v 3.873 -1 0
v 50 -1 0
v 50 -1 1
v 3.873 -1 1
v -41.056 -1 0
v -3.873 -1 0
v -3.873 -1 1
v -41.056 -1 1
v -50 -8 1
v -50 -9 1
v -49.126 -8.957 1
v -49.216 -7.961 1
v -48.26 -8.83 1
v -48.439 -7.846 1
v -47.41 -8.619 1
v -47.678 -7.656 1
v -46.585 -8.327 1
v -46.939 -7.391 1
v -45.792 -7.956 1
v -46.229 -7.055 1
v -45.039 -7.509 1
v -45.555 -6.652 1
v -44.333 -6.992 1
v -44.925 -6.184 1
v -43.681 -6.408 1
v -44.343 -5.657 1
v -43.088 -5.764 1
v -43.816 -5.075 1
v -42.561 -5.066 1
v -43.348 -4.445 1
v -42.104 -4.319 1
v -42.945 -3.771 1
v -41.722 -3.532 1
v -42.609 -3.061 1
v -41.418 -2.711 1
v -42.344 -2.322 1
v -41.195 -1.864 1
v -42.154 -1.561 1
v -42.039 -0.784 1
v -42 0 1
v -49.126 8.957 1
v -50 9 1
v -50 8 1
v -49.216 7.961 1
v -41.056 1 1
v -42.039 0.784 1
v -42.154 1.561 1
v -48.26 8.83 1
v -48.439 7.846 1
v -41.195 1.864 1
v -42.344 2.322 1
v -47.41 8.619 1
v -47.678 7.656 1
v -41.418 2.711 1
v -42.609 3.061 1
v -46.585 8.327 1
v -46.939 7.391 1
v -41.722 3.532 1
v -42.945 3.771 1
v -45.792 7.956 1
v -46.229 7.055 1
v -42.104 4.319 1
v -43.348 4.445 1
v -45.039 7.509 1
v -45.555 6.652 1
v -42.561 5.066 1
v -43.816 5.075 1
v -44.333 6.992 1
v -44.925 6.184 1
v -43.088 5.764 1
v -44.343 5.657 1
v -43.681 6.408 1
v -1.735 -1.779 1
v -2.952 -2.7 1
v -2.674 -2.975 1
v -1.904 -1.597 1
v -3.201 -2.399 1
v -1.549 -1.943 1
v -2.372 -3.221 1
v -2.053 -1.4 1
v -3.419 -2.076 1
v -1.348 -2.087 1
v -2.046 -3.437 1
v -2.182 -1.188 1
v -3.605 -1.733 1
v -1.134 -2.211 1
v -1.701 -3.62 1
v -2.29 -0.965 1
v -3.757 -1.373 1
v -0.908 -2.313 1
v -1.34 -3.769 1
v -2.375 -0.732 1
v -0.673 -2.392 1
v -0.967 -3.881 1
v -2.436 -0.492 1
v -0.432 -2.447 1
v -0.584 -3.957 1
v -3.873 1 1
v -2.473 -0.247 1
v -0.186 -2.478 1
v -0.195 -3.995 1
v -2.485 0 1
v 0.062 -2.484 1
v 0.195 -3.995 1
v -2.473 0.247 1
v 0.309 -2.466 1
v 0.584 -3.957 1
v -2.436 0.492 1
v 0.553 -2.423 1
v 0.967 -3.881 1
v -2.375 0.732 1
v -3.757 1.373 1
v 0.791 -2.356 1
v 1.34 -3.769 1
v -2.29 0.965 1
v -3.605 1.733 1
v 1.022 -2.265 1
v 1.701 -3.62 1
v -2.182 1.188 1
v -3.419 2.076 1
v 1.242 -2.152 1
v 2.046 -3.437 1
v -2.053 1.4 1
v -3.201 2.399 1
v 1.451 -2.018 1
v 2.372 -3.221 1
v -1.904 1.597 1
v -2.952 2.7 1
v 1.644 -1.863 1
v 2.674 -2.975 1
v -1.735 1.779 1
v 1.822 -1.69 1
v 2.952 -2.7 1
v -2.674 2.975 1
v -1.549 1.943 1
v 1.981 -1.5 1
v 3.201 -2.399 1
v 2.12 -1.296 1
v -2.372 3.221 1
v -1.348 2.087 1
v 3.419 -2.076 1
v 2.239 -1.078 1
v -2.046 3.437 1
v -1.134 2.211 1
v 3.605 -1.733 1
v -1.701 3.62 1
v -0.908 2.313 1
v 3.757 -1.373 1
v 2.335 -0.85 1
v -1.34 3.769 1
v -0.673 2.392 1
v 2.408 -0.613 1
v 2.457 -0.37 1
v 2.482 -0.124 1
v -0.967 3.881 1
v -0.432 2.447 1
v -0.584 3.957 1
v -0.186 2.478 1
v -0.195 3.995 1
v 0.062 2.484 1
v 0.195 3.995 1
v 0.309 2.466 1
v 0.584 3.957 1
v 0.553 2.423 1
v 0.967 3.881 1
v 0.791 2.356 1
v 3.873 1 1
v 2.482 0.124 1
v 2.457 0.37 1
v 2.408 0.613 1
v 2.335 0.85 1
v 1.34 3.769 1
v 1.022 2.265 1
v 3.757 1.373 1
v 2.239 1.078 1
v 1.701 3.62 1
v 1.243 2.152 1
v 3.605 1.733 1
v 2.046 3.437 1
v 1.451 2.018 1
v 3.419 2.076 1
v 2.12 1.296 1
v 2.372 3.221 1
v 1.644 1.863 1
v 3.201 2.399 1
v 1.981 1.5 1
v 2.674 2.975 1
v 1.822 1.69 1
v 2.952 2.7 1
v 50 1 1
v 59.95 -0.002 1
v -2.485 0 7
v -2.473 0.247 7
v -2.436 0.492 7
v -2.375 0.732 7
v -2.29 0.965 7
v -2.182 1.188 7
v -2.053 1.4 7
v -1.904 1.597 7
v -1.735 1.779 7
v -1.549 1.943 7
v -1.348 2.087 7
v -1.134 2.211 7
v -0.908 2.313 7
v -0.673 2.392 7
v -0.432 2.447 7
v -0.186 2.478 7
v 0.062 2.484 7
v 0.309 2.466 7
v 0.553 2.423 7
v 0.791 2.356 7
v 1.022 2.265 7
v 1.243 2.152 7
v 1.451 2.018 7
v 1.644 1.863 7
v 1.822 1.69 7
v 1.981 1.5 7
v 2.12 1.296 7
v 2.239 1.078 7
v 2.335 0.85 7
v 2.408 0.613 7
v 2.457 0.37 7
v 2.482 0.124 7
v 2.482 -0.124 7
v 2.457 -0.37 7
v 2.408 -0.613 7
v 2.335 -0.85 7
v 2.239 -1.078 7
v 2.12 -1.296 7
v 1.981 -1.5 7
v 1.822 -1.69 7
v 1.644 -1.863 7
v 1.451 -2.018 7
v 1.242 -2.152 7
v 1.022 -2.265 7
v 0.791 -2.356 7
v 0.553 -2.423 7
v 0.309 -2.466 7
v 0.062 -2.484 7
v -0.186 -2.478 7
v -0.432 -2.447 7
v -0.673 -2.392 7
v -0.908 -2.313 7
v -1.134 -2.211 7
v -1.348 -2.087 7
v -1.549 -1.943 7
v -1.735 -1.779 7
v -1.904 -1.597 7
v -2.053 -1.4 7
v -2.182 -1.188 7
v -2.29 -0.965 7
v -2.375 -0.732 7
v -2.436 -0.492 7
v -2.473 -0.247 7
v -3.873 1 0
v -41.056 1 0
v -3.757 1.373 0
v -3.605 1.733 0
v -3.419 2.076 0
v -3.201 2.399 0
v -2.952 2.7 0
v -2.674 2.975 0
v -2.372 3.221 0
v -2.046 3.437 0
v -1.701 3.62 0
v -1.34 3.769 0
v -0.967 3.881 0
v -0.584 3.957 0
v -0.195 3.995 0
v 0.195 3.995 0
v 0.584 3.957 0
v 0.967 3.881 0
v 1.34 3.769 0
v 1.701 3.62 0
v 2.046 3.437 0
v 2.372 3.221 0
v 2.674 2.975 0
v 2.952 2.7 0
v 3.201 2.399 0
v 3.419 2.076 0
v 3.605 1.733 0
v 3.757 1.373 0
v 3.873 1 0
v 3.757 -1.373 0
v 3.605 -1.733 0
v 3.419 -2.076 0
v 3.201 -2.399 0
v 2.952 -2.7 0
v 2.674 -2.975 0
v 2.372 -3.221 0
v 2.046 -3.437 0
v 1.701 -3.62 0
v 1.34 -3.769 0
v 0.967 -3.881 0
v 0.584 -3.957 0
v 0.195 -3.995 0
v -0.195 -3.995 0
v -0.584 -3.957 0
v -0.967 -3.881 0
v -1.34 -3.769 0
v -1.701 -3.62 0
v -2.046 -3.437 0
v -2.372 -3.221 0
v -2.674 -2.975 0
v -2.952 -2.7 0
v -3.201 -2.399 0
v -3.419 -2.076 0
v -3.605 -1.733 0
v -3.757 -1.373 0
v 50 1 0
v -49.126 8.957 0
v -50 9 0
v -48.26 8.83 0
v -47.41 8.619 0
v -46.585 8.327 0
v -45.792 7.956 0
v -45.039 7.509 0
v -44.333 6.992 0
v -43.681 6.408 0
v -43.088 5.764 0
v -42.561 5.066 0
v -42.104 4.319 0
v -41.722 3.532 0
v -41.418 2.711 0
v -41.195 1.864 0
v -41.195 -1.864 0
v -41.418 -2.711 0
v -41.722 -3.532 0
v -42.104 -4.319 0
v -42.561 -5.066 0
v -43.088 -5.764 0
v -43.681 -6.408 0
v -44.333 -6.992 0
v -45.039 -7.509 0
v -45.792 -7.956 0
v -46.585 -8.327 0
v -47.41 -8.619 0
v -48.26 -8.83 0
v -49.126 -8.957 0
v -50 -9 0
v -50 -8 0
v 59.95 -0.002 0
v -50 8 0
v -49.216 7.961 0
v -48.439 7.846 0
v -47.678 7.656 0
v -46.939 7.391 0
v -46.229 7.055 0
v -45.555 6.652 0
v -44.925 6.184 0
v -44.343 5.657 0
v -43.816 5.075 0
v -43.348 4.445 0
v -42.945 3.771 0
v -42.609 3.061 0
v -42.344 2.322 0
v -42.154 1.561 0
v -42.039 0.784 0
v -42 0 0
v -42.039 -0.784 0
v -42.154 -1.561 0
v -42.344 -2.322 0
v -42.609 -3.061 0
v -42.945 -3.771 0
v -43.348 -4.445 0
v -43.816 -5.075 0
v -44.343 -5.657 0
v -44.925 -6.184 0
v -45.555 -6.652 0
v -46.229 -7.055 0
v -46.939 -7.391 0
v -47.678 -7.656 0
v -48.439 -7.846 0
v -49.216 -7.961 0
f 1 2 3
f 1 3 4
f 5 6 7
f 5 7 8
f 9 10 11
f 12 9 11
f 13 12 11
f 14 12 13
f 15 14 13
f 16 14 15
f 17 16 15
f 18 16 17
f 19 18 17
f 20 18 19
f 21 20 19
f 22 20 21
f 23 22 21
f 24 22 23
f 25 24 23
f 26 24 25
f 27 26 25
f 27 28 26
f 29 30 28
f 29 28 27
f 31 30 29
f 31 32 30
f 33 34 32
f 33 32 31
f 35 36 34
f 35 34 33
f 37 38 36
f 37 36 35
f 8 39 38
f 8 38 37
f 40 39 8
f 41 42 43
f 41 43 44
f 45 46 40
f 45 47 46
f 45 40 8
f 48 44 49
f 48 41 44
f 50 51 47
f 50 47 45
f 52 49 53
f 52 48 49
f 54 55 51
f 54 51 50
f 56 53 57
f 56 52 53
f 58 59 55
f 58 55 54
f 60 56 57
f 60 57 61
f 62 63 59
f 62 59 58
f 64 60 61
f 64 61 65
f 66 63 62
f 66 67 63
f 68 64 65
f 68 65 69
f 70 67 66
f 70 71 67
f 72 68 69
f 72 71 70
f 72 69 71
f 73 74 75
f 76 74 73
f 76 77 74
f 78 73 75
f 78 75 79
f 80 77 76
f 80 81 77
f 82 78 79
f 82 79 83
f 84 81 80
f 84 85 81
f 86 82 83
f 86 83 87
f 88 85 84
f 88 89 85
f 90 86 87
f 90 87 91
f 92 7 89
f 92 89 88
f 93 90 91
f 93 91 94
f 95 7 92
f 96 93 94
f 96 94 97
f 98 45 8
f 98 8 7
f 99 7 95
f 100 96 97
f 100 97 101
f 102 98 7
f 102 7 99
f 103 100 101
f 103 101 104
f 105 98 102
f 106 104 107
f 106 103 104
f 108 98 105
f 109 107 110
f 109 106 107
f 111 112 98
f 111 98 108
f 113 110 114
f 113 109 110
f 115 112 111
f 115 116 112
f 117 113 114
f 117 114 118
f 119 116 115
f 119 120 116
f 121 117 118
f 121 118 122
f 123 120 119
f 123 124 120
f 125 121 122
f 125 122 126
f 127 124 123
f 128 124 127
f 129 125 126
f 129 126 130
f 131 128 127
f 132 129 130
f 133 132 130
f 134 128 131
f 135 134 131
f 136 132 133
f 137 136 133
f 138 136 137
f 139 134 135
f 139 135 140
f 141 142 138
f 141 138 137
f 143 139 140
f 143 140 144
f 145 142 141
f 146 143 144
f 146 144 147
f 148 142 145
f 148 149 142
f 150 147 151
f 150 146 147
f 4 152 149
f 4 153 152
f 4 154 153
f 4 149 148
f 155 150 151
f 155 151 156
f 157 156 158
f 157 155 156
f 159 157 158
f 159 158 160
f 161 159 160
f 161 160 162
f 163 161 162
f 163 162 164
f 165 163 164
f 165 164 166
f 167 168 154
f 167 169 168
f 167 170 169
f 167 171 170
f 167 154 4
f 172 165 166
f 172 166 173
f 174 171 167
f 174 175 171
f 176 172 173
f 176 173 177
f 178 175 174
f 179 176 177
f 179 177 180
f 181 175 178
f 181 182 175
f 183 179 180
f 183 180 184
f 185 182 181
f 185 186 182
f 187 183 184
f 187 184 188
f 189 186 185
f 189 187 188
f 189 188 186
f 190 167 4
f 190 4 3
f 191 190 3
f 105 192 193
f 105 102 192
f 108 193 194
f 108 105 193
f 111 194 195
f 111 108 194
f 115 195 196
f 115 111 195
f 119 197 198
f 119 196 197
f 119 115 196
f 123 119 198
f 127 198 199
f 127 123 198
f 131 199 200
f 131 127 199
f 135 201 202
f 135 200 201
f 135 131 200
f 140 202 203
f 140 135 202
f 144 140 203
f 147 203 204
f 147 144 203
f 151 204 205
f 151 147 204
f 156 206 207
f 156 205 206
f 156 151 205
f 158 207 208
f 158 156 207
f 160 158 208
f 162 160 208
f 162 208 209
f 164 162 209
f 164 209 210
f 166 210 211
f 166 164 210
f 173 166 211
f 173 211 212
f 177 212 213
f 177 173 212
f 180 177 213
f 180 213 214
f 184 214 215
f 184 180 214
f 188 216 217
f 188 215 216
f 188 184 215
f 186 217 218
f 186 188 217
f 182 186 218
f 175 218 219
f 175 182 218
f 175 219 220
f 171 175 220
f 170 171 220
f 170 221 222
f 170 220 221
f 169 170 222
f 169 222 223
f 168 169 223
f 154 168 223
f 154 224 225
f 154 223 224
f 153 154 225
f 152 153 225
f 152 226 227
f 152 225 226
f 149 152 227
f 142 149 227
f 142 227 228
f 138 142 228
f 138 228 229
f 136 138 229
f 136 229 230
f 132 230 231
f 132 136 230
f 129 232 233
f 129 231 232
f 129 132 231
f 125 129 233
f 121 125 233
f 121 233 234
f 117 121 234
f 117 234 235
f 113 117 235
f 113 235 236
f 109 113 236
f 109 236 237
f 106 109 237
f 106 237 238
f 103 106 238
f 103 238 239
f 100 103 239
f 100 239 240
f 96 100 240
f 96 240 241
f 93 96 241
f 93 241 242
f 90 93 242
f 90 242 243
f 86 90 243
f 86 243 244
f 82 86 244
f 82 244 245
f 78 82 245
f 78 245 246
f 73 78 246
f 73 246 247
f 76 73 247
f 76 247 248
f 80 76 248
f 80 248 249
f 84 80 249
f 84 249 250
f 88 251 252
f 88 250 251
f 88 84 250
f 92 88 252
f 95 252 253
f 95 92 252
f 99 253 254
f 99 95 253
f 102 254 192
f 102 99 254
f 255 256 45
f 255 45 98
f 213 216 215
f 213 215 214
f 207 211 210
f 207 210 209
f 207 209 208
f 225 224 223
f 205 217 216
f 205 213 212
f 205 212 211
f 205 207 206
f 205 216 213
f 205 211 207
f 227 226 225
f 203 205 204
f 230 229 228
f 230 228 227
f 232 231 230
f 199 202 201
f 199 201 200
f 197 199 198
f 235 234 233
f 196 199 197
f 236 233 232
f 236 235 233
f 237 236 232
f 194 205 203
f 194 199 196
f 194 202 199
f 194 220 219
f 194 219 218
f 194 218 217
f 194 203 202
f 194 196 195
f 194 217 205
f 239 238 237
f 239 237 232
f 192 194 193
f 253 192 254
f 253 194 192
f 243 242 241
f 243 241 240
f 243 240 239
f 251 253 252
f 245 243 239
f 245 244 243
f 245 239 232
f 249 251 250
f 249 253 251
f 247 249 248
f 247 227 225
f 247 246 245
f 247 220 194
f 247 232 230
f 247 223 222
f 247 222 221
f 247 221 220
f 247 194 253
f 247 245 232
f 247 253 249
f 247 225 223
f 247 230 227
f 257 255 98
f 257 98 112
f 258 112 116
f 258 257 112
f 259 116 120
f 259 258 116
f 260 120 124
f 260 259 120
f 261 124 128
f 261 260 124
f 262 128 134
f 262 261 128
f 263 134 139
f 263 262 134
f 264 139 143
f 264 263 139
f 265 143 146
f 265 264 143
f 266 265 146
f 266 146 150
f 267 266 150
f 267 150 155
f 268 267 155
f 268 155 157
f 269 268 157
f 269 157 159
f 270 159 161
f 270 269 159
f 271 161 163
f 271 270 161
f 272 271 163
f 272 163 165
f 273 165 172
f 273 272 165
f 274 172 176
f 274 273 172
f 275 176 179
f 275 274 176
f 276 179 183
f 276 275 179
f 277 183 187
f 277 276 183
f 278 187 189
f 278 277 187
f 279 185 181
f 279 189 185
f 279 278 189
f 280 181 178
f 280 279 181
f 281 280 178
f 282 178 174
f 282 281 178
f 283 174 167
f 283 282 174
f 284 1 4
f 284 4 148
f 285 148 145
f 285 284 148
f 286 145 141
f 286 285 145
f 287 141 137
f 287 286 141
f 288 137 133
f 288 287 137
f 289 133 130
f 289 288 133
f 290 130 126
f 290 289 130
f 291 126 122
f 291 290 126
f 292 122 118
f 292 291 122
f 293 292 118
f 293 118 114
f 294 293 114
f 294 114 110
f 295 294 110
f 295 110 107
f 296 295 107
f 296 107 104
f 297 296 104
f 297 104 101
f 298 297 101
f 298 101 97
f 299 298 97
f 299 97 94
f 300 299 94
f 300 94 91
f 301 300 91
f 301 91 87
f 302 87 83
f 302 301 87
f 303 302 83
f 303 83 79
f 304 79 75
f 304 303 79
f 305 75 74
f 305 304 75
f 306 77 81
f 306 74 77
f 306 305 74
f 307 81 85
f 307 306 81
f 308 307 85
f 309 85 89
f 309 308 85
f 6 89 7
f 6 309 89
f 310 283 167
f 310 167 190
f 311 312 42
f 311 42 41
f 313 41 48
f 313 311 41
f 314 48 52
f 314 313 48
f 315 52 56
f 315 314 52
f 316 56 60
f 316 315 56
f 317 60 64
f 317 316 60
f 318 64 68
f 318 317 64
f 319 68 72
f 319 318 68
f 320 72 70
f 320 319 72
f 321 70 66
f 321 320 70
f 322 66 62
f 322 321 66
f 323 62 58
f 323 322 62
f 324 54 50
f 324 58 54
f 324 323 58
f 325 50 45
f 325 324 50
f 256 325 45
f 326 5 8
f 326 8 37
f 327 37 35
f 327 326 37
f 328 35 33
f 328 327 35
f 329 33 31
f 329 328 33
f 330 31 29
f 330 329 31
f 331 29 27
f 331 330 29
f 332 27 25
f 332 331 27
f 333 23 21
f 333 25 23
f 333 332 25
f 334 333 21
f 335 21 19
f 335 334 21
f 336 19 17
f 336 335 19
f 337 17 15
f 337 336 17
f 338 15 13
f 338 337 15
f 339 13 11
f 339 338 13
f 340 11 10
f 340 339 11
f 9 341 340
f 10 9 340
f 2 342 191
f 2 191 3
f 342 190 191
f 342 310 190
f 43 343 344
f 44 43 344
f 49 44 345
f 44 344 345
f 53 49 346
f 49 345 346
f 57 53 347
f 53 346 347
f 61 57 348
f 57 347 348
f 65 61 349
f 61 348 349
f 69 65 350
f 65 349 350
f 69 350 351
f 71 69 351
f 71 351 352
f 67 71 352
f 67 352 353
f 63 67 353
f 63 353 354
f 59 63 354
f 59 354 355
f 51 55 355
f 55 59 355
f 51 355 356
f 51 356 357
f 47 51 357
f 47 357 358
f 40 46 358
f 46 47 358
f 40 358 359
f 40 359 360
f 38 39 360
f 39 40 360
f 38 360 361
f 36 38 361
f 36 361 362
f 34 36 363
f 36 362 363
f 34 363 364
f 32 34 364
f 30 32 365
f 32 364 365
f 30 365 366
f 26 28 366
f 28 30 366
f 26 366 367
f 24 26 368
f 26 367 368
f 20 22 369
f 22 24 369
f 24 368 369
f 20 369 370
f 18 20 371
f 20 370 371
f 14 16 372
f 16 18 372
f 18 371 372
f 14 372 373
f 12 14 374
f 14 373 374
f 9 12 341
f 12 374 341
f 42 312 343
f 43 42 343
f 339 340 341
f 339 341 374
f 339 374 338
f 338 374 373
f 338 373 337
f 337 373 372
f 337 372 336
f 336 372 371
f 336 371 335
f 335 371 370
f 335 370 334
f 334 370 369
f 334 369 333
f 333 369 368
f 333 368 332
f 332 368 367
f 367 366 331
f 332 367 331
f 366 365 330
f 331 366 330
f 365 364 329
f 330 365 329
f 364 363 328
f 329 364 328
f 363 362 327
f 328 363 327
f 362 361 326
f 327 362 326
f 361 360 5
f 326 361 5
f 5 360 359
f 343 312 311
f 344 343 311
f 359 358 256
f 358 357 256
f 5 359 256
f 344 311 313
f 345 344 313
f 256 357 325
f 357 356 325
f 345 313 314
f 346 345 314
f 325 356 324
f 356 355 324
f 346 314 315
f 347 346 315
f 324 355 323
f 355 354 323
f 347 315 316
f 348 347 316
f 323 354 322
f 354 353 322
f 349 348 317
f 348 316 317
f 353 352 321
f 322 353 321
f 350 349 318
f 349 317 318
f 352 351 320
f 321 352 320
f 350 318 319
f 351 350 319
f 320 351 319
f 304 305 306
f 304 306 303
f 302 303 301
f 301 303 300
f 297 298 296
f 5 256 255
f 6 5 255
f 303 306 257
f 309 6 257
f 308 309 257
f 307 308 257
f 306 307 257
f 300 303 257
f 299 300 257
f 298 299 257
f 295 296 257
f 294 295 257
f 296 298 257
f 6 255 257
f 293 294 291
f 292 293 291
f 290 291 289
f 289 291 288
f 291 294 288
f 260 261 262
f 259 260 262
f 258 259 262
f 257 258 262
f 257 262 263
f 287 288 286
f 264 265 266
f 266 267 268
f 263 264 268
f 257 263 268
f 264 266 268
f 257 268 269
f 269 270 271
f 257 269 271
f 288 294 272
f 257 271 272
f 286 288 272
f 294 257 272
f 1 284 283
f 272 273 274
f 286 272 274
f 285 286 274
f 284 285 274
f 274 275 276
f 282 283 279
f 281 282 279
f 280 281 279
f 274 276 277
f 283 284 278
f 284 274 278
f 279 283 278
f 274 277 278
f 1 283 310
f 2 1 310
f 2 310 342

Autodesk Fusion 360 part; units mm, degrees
sketch "Sketch1" plane through (0, 0, 0) normal (0, 0, 1) x (1, 0, 0)
  line L0 (-50, 1) -> (50, -1) construction
  line L1 (50, 1) -> (-50, -1) construction
  line L2 (50, 1) -> (60, 1) construction
  line L3 (50, -1) -> (60, -1) construction
  arc A0 (-50, -8) -> (-50, 8) centre (-50, 0) ccw
  line L4 (-50, 9) -> (-50, 8)
  line L5 (-50, -8) -> (-50, -9)
  line L6 (50, 1) -> (59.9497, -0.002)
  line L7 (59.9497, -0.002) -> (50, -1)
  arc A1 (3.9992, -0.08) -> (3.9992, 0.08) centre (0, 0) ccw
  arc A2 (3.873, 1) -> (-3.873, 1) centre (0, 0) ccw
  arc A3 (-3.9992, 0.08) -> (-3.9992, -0.08) centre (0, 0) ccw
  arc A4 (-3.873, -1) -> (3.873, -1) centre (0, 0) ccw
  arc A5 (-50, -9) -> (-41.0557, -1) centre (-50, 0) ccw
  arc A6 (-41.0557, 1) -> (-50, 9) centre (-50, 0) ccw
  line L8 (-41.0557, 1) -> (-3.873, 1)
  line L9 (3.873, 1) -> (50, 1)
  line L10 (50, -1) -> (3.873, -1)
  line L11 (-3.873, -1) -> (-41.0557, -1)
  dimension "d57" = 8
  dimension "d58" = 100
  dimension "d59" = 2
  dimension "d64" = 8
  dimension "d66" = 10
extrude "Extrude1" add sketch "Sketch1" along normal blind 1
sketch "Sketch2" plane through (0, 0, 1) normal (0, 0, 1) x (-1, 0, 0)
  arc A0 (-3.873, -1) -> (3.873, -1) centre (0, 0) ccw
  line L0 (3.873, -1) -> (41.0557, -1)
  arc A1 (41.0557, -1) -> (50, -9) centre (50, 0) ccw
  line L1 (50, -9) -> (50, -8)
  arc A2 (50, 8) -> (50, -8) centre (50, 0) ccw
  line L2 (50, 8) -> (50, 9)
  arc A3 (50, 9) -> (41.0557, 1) centre (50, 0) ccw
  line L3 (41.0557, 1) -> (3.873, 1)
  arc A4 (3.873, 1) -> (-3.873, 1) centre (0, 0) ccw
  line L4 (-3.873, 1) -> (-50, 1)
  line L5 (-50, 1) -> (-59.9497, 0.002)
  line L6 (-59.9497, 0.002) -> (-50, -1)
  line L7 (-50, -1) -> (-3.873, -1)
  circle A5 centre (0, 0) radius 2.485
  dimension "d69" = 4.97
extrude "Extrude2" add sketch "Sketch2" along normal blind 6 contours A5
